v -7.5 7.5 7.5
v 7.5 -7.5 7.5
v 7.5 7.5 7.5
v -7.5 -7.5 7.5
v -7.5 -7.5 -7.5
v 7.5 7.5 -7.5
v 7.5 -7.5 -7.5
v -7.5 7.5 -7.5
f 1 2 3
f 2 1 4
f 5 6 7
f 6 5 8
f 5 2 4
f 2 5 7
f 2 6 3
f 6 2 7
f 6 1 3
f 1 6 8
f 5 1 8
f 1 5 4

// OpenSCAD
// Auto-generated from tests/data/feature_fixtures_manifest.json
// fixture: box_cubic
// fixture_type: box
// description: Cubic box (15x15x15) to verify unity-aspect-ratio handling without misclassification.
$fn = 96;

box_size = [15.000000, 15.000000, 15.000000];
box_origin = [-7.500000, -7.500000, -7.500000];

module through_hole_x(center, diameter, length) {
  translate([box_origin[0] - 0.1, center[1], center[2]])
    rotate(a=90, v=[0, 1, 0]) cylinder(d=diameter, h=length, center=false);
}

module through_hole_y(center, diameter, length) {
  translate([center[0], box_origin[1] - 0.1, center[2]])
    rotate(a=90, v=[-1, 0, 0]) cylinder(d=diameter, h=length, center=false);
}

module through_hole_z(center, diameter, length) {
  translate([center[0], center[1], box_origin[2] - 0.1])
    cylinder(d=diameter, h=length, center=false);
}

difference() {
  translate(box_origin) cube(box_size);
}
